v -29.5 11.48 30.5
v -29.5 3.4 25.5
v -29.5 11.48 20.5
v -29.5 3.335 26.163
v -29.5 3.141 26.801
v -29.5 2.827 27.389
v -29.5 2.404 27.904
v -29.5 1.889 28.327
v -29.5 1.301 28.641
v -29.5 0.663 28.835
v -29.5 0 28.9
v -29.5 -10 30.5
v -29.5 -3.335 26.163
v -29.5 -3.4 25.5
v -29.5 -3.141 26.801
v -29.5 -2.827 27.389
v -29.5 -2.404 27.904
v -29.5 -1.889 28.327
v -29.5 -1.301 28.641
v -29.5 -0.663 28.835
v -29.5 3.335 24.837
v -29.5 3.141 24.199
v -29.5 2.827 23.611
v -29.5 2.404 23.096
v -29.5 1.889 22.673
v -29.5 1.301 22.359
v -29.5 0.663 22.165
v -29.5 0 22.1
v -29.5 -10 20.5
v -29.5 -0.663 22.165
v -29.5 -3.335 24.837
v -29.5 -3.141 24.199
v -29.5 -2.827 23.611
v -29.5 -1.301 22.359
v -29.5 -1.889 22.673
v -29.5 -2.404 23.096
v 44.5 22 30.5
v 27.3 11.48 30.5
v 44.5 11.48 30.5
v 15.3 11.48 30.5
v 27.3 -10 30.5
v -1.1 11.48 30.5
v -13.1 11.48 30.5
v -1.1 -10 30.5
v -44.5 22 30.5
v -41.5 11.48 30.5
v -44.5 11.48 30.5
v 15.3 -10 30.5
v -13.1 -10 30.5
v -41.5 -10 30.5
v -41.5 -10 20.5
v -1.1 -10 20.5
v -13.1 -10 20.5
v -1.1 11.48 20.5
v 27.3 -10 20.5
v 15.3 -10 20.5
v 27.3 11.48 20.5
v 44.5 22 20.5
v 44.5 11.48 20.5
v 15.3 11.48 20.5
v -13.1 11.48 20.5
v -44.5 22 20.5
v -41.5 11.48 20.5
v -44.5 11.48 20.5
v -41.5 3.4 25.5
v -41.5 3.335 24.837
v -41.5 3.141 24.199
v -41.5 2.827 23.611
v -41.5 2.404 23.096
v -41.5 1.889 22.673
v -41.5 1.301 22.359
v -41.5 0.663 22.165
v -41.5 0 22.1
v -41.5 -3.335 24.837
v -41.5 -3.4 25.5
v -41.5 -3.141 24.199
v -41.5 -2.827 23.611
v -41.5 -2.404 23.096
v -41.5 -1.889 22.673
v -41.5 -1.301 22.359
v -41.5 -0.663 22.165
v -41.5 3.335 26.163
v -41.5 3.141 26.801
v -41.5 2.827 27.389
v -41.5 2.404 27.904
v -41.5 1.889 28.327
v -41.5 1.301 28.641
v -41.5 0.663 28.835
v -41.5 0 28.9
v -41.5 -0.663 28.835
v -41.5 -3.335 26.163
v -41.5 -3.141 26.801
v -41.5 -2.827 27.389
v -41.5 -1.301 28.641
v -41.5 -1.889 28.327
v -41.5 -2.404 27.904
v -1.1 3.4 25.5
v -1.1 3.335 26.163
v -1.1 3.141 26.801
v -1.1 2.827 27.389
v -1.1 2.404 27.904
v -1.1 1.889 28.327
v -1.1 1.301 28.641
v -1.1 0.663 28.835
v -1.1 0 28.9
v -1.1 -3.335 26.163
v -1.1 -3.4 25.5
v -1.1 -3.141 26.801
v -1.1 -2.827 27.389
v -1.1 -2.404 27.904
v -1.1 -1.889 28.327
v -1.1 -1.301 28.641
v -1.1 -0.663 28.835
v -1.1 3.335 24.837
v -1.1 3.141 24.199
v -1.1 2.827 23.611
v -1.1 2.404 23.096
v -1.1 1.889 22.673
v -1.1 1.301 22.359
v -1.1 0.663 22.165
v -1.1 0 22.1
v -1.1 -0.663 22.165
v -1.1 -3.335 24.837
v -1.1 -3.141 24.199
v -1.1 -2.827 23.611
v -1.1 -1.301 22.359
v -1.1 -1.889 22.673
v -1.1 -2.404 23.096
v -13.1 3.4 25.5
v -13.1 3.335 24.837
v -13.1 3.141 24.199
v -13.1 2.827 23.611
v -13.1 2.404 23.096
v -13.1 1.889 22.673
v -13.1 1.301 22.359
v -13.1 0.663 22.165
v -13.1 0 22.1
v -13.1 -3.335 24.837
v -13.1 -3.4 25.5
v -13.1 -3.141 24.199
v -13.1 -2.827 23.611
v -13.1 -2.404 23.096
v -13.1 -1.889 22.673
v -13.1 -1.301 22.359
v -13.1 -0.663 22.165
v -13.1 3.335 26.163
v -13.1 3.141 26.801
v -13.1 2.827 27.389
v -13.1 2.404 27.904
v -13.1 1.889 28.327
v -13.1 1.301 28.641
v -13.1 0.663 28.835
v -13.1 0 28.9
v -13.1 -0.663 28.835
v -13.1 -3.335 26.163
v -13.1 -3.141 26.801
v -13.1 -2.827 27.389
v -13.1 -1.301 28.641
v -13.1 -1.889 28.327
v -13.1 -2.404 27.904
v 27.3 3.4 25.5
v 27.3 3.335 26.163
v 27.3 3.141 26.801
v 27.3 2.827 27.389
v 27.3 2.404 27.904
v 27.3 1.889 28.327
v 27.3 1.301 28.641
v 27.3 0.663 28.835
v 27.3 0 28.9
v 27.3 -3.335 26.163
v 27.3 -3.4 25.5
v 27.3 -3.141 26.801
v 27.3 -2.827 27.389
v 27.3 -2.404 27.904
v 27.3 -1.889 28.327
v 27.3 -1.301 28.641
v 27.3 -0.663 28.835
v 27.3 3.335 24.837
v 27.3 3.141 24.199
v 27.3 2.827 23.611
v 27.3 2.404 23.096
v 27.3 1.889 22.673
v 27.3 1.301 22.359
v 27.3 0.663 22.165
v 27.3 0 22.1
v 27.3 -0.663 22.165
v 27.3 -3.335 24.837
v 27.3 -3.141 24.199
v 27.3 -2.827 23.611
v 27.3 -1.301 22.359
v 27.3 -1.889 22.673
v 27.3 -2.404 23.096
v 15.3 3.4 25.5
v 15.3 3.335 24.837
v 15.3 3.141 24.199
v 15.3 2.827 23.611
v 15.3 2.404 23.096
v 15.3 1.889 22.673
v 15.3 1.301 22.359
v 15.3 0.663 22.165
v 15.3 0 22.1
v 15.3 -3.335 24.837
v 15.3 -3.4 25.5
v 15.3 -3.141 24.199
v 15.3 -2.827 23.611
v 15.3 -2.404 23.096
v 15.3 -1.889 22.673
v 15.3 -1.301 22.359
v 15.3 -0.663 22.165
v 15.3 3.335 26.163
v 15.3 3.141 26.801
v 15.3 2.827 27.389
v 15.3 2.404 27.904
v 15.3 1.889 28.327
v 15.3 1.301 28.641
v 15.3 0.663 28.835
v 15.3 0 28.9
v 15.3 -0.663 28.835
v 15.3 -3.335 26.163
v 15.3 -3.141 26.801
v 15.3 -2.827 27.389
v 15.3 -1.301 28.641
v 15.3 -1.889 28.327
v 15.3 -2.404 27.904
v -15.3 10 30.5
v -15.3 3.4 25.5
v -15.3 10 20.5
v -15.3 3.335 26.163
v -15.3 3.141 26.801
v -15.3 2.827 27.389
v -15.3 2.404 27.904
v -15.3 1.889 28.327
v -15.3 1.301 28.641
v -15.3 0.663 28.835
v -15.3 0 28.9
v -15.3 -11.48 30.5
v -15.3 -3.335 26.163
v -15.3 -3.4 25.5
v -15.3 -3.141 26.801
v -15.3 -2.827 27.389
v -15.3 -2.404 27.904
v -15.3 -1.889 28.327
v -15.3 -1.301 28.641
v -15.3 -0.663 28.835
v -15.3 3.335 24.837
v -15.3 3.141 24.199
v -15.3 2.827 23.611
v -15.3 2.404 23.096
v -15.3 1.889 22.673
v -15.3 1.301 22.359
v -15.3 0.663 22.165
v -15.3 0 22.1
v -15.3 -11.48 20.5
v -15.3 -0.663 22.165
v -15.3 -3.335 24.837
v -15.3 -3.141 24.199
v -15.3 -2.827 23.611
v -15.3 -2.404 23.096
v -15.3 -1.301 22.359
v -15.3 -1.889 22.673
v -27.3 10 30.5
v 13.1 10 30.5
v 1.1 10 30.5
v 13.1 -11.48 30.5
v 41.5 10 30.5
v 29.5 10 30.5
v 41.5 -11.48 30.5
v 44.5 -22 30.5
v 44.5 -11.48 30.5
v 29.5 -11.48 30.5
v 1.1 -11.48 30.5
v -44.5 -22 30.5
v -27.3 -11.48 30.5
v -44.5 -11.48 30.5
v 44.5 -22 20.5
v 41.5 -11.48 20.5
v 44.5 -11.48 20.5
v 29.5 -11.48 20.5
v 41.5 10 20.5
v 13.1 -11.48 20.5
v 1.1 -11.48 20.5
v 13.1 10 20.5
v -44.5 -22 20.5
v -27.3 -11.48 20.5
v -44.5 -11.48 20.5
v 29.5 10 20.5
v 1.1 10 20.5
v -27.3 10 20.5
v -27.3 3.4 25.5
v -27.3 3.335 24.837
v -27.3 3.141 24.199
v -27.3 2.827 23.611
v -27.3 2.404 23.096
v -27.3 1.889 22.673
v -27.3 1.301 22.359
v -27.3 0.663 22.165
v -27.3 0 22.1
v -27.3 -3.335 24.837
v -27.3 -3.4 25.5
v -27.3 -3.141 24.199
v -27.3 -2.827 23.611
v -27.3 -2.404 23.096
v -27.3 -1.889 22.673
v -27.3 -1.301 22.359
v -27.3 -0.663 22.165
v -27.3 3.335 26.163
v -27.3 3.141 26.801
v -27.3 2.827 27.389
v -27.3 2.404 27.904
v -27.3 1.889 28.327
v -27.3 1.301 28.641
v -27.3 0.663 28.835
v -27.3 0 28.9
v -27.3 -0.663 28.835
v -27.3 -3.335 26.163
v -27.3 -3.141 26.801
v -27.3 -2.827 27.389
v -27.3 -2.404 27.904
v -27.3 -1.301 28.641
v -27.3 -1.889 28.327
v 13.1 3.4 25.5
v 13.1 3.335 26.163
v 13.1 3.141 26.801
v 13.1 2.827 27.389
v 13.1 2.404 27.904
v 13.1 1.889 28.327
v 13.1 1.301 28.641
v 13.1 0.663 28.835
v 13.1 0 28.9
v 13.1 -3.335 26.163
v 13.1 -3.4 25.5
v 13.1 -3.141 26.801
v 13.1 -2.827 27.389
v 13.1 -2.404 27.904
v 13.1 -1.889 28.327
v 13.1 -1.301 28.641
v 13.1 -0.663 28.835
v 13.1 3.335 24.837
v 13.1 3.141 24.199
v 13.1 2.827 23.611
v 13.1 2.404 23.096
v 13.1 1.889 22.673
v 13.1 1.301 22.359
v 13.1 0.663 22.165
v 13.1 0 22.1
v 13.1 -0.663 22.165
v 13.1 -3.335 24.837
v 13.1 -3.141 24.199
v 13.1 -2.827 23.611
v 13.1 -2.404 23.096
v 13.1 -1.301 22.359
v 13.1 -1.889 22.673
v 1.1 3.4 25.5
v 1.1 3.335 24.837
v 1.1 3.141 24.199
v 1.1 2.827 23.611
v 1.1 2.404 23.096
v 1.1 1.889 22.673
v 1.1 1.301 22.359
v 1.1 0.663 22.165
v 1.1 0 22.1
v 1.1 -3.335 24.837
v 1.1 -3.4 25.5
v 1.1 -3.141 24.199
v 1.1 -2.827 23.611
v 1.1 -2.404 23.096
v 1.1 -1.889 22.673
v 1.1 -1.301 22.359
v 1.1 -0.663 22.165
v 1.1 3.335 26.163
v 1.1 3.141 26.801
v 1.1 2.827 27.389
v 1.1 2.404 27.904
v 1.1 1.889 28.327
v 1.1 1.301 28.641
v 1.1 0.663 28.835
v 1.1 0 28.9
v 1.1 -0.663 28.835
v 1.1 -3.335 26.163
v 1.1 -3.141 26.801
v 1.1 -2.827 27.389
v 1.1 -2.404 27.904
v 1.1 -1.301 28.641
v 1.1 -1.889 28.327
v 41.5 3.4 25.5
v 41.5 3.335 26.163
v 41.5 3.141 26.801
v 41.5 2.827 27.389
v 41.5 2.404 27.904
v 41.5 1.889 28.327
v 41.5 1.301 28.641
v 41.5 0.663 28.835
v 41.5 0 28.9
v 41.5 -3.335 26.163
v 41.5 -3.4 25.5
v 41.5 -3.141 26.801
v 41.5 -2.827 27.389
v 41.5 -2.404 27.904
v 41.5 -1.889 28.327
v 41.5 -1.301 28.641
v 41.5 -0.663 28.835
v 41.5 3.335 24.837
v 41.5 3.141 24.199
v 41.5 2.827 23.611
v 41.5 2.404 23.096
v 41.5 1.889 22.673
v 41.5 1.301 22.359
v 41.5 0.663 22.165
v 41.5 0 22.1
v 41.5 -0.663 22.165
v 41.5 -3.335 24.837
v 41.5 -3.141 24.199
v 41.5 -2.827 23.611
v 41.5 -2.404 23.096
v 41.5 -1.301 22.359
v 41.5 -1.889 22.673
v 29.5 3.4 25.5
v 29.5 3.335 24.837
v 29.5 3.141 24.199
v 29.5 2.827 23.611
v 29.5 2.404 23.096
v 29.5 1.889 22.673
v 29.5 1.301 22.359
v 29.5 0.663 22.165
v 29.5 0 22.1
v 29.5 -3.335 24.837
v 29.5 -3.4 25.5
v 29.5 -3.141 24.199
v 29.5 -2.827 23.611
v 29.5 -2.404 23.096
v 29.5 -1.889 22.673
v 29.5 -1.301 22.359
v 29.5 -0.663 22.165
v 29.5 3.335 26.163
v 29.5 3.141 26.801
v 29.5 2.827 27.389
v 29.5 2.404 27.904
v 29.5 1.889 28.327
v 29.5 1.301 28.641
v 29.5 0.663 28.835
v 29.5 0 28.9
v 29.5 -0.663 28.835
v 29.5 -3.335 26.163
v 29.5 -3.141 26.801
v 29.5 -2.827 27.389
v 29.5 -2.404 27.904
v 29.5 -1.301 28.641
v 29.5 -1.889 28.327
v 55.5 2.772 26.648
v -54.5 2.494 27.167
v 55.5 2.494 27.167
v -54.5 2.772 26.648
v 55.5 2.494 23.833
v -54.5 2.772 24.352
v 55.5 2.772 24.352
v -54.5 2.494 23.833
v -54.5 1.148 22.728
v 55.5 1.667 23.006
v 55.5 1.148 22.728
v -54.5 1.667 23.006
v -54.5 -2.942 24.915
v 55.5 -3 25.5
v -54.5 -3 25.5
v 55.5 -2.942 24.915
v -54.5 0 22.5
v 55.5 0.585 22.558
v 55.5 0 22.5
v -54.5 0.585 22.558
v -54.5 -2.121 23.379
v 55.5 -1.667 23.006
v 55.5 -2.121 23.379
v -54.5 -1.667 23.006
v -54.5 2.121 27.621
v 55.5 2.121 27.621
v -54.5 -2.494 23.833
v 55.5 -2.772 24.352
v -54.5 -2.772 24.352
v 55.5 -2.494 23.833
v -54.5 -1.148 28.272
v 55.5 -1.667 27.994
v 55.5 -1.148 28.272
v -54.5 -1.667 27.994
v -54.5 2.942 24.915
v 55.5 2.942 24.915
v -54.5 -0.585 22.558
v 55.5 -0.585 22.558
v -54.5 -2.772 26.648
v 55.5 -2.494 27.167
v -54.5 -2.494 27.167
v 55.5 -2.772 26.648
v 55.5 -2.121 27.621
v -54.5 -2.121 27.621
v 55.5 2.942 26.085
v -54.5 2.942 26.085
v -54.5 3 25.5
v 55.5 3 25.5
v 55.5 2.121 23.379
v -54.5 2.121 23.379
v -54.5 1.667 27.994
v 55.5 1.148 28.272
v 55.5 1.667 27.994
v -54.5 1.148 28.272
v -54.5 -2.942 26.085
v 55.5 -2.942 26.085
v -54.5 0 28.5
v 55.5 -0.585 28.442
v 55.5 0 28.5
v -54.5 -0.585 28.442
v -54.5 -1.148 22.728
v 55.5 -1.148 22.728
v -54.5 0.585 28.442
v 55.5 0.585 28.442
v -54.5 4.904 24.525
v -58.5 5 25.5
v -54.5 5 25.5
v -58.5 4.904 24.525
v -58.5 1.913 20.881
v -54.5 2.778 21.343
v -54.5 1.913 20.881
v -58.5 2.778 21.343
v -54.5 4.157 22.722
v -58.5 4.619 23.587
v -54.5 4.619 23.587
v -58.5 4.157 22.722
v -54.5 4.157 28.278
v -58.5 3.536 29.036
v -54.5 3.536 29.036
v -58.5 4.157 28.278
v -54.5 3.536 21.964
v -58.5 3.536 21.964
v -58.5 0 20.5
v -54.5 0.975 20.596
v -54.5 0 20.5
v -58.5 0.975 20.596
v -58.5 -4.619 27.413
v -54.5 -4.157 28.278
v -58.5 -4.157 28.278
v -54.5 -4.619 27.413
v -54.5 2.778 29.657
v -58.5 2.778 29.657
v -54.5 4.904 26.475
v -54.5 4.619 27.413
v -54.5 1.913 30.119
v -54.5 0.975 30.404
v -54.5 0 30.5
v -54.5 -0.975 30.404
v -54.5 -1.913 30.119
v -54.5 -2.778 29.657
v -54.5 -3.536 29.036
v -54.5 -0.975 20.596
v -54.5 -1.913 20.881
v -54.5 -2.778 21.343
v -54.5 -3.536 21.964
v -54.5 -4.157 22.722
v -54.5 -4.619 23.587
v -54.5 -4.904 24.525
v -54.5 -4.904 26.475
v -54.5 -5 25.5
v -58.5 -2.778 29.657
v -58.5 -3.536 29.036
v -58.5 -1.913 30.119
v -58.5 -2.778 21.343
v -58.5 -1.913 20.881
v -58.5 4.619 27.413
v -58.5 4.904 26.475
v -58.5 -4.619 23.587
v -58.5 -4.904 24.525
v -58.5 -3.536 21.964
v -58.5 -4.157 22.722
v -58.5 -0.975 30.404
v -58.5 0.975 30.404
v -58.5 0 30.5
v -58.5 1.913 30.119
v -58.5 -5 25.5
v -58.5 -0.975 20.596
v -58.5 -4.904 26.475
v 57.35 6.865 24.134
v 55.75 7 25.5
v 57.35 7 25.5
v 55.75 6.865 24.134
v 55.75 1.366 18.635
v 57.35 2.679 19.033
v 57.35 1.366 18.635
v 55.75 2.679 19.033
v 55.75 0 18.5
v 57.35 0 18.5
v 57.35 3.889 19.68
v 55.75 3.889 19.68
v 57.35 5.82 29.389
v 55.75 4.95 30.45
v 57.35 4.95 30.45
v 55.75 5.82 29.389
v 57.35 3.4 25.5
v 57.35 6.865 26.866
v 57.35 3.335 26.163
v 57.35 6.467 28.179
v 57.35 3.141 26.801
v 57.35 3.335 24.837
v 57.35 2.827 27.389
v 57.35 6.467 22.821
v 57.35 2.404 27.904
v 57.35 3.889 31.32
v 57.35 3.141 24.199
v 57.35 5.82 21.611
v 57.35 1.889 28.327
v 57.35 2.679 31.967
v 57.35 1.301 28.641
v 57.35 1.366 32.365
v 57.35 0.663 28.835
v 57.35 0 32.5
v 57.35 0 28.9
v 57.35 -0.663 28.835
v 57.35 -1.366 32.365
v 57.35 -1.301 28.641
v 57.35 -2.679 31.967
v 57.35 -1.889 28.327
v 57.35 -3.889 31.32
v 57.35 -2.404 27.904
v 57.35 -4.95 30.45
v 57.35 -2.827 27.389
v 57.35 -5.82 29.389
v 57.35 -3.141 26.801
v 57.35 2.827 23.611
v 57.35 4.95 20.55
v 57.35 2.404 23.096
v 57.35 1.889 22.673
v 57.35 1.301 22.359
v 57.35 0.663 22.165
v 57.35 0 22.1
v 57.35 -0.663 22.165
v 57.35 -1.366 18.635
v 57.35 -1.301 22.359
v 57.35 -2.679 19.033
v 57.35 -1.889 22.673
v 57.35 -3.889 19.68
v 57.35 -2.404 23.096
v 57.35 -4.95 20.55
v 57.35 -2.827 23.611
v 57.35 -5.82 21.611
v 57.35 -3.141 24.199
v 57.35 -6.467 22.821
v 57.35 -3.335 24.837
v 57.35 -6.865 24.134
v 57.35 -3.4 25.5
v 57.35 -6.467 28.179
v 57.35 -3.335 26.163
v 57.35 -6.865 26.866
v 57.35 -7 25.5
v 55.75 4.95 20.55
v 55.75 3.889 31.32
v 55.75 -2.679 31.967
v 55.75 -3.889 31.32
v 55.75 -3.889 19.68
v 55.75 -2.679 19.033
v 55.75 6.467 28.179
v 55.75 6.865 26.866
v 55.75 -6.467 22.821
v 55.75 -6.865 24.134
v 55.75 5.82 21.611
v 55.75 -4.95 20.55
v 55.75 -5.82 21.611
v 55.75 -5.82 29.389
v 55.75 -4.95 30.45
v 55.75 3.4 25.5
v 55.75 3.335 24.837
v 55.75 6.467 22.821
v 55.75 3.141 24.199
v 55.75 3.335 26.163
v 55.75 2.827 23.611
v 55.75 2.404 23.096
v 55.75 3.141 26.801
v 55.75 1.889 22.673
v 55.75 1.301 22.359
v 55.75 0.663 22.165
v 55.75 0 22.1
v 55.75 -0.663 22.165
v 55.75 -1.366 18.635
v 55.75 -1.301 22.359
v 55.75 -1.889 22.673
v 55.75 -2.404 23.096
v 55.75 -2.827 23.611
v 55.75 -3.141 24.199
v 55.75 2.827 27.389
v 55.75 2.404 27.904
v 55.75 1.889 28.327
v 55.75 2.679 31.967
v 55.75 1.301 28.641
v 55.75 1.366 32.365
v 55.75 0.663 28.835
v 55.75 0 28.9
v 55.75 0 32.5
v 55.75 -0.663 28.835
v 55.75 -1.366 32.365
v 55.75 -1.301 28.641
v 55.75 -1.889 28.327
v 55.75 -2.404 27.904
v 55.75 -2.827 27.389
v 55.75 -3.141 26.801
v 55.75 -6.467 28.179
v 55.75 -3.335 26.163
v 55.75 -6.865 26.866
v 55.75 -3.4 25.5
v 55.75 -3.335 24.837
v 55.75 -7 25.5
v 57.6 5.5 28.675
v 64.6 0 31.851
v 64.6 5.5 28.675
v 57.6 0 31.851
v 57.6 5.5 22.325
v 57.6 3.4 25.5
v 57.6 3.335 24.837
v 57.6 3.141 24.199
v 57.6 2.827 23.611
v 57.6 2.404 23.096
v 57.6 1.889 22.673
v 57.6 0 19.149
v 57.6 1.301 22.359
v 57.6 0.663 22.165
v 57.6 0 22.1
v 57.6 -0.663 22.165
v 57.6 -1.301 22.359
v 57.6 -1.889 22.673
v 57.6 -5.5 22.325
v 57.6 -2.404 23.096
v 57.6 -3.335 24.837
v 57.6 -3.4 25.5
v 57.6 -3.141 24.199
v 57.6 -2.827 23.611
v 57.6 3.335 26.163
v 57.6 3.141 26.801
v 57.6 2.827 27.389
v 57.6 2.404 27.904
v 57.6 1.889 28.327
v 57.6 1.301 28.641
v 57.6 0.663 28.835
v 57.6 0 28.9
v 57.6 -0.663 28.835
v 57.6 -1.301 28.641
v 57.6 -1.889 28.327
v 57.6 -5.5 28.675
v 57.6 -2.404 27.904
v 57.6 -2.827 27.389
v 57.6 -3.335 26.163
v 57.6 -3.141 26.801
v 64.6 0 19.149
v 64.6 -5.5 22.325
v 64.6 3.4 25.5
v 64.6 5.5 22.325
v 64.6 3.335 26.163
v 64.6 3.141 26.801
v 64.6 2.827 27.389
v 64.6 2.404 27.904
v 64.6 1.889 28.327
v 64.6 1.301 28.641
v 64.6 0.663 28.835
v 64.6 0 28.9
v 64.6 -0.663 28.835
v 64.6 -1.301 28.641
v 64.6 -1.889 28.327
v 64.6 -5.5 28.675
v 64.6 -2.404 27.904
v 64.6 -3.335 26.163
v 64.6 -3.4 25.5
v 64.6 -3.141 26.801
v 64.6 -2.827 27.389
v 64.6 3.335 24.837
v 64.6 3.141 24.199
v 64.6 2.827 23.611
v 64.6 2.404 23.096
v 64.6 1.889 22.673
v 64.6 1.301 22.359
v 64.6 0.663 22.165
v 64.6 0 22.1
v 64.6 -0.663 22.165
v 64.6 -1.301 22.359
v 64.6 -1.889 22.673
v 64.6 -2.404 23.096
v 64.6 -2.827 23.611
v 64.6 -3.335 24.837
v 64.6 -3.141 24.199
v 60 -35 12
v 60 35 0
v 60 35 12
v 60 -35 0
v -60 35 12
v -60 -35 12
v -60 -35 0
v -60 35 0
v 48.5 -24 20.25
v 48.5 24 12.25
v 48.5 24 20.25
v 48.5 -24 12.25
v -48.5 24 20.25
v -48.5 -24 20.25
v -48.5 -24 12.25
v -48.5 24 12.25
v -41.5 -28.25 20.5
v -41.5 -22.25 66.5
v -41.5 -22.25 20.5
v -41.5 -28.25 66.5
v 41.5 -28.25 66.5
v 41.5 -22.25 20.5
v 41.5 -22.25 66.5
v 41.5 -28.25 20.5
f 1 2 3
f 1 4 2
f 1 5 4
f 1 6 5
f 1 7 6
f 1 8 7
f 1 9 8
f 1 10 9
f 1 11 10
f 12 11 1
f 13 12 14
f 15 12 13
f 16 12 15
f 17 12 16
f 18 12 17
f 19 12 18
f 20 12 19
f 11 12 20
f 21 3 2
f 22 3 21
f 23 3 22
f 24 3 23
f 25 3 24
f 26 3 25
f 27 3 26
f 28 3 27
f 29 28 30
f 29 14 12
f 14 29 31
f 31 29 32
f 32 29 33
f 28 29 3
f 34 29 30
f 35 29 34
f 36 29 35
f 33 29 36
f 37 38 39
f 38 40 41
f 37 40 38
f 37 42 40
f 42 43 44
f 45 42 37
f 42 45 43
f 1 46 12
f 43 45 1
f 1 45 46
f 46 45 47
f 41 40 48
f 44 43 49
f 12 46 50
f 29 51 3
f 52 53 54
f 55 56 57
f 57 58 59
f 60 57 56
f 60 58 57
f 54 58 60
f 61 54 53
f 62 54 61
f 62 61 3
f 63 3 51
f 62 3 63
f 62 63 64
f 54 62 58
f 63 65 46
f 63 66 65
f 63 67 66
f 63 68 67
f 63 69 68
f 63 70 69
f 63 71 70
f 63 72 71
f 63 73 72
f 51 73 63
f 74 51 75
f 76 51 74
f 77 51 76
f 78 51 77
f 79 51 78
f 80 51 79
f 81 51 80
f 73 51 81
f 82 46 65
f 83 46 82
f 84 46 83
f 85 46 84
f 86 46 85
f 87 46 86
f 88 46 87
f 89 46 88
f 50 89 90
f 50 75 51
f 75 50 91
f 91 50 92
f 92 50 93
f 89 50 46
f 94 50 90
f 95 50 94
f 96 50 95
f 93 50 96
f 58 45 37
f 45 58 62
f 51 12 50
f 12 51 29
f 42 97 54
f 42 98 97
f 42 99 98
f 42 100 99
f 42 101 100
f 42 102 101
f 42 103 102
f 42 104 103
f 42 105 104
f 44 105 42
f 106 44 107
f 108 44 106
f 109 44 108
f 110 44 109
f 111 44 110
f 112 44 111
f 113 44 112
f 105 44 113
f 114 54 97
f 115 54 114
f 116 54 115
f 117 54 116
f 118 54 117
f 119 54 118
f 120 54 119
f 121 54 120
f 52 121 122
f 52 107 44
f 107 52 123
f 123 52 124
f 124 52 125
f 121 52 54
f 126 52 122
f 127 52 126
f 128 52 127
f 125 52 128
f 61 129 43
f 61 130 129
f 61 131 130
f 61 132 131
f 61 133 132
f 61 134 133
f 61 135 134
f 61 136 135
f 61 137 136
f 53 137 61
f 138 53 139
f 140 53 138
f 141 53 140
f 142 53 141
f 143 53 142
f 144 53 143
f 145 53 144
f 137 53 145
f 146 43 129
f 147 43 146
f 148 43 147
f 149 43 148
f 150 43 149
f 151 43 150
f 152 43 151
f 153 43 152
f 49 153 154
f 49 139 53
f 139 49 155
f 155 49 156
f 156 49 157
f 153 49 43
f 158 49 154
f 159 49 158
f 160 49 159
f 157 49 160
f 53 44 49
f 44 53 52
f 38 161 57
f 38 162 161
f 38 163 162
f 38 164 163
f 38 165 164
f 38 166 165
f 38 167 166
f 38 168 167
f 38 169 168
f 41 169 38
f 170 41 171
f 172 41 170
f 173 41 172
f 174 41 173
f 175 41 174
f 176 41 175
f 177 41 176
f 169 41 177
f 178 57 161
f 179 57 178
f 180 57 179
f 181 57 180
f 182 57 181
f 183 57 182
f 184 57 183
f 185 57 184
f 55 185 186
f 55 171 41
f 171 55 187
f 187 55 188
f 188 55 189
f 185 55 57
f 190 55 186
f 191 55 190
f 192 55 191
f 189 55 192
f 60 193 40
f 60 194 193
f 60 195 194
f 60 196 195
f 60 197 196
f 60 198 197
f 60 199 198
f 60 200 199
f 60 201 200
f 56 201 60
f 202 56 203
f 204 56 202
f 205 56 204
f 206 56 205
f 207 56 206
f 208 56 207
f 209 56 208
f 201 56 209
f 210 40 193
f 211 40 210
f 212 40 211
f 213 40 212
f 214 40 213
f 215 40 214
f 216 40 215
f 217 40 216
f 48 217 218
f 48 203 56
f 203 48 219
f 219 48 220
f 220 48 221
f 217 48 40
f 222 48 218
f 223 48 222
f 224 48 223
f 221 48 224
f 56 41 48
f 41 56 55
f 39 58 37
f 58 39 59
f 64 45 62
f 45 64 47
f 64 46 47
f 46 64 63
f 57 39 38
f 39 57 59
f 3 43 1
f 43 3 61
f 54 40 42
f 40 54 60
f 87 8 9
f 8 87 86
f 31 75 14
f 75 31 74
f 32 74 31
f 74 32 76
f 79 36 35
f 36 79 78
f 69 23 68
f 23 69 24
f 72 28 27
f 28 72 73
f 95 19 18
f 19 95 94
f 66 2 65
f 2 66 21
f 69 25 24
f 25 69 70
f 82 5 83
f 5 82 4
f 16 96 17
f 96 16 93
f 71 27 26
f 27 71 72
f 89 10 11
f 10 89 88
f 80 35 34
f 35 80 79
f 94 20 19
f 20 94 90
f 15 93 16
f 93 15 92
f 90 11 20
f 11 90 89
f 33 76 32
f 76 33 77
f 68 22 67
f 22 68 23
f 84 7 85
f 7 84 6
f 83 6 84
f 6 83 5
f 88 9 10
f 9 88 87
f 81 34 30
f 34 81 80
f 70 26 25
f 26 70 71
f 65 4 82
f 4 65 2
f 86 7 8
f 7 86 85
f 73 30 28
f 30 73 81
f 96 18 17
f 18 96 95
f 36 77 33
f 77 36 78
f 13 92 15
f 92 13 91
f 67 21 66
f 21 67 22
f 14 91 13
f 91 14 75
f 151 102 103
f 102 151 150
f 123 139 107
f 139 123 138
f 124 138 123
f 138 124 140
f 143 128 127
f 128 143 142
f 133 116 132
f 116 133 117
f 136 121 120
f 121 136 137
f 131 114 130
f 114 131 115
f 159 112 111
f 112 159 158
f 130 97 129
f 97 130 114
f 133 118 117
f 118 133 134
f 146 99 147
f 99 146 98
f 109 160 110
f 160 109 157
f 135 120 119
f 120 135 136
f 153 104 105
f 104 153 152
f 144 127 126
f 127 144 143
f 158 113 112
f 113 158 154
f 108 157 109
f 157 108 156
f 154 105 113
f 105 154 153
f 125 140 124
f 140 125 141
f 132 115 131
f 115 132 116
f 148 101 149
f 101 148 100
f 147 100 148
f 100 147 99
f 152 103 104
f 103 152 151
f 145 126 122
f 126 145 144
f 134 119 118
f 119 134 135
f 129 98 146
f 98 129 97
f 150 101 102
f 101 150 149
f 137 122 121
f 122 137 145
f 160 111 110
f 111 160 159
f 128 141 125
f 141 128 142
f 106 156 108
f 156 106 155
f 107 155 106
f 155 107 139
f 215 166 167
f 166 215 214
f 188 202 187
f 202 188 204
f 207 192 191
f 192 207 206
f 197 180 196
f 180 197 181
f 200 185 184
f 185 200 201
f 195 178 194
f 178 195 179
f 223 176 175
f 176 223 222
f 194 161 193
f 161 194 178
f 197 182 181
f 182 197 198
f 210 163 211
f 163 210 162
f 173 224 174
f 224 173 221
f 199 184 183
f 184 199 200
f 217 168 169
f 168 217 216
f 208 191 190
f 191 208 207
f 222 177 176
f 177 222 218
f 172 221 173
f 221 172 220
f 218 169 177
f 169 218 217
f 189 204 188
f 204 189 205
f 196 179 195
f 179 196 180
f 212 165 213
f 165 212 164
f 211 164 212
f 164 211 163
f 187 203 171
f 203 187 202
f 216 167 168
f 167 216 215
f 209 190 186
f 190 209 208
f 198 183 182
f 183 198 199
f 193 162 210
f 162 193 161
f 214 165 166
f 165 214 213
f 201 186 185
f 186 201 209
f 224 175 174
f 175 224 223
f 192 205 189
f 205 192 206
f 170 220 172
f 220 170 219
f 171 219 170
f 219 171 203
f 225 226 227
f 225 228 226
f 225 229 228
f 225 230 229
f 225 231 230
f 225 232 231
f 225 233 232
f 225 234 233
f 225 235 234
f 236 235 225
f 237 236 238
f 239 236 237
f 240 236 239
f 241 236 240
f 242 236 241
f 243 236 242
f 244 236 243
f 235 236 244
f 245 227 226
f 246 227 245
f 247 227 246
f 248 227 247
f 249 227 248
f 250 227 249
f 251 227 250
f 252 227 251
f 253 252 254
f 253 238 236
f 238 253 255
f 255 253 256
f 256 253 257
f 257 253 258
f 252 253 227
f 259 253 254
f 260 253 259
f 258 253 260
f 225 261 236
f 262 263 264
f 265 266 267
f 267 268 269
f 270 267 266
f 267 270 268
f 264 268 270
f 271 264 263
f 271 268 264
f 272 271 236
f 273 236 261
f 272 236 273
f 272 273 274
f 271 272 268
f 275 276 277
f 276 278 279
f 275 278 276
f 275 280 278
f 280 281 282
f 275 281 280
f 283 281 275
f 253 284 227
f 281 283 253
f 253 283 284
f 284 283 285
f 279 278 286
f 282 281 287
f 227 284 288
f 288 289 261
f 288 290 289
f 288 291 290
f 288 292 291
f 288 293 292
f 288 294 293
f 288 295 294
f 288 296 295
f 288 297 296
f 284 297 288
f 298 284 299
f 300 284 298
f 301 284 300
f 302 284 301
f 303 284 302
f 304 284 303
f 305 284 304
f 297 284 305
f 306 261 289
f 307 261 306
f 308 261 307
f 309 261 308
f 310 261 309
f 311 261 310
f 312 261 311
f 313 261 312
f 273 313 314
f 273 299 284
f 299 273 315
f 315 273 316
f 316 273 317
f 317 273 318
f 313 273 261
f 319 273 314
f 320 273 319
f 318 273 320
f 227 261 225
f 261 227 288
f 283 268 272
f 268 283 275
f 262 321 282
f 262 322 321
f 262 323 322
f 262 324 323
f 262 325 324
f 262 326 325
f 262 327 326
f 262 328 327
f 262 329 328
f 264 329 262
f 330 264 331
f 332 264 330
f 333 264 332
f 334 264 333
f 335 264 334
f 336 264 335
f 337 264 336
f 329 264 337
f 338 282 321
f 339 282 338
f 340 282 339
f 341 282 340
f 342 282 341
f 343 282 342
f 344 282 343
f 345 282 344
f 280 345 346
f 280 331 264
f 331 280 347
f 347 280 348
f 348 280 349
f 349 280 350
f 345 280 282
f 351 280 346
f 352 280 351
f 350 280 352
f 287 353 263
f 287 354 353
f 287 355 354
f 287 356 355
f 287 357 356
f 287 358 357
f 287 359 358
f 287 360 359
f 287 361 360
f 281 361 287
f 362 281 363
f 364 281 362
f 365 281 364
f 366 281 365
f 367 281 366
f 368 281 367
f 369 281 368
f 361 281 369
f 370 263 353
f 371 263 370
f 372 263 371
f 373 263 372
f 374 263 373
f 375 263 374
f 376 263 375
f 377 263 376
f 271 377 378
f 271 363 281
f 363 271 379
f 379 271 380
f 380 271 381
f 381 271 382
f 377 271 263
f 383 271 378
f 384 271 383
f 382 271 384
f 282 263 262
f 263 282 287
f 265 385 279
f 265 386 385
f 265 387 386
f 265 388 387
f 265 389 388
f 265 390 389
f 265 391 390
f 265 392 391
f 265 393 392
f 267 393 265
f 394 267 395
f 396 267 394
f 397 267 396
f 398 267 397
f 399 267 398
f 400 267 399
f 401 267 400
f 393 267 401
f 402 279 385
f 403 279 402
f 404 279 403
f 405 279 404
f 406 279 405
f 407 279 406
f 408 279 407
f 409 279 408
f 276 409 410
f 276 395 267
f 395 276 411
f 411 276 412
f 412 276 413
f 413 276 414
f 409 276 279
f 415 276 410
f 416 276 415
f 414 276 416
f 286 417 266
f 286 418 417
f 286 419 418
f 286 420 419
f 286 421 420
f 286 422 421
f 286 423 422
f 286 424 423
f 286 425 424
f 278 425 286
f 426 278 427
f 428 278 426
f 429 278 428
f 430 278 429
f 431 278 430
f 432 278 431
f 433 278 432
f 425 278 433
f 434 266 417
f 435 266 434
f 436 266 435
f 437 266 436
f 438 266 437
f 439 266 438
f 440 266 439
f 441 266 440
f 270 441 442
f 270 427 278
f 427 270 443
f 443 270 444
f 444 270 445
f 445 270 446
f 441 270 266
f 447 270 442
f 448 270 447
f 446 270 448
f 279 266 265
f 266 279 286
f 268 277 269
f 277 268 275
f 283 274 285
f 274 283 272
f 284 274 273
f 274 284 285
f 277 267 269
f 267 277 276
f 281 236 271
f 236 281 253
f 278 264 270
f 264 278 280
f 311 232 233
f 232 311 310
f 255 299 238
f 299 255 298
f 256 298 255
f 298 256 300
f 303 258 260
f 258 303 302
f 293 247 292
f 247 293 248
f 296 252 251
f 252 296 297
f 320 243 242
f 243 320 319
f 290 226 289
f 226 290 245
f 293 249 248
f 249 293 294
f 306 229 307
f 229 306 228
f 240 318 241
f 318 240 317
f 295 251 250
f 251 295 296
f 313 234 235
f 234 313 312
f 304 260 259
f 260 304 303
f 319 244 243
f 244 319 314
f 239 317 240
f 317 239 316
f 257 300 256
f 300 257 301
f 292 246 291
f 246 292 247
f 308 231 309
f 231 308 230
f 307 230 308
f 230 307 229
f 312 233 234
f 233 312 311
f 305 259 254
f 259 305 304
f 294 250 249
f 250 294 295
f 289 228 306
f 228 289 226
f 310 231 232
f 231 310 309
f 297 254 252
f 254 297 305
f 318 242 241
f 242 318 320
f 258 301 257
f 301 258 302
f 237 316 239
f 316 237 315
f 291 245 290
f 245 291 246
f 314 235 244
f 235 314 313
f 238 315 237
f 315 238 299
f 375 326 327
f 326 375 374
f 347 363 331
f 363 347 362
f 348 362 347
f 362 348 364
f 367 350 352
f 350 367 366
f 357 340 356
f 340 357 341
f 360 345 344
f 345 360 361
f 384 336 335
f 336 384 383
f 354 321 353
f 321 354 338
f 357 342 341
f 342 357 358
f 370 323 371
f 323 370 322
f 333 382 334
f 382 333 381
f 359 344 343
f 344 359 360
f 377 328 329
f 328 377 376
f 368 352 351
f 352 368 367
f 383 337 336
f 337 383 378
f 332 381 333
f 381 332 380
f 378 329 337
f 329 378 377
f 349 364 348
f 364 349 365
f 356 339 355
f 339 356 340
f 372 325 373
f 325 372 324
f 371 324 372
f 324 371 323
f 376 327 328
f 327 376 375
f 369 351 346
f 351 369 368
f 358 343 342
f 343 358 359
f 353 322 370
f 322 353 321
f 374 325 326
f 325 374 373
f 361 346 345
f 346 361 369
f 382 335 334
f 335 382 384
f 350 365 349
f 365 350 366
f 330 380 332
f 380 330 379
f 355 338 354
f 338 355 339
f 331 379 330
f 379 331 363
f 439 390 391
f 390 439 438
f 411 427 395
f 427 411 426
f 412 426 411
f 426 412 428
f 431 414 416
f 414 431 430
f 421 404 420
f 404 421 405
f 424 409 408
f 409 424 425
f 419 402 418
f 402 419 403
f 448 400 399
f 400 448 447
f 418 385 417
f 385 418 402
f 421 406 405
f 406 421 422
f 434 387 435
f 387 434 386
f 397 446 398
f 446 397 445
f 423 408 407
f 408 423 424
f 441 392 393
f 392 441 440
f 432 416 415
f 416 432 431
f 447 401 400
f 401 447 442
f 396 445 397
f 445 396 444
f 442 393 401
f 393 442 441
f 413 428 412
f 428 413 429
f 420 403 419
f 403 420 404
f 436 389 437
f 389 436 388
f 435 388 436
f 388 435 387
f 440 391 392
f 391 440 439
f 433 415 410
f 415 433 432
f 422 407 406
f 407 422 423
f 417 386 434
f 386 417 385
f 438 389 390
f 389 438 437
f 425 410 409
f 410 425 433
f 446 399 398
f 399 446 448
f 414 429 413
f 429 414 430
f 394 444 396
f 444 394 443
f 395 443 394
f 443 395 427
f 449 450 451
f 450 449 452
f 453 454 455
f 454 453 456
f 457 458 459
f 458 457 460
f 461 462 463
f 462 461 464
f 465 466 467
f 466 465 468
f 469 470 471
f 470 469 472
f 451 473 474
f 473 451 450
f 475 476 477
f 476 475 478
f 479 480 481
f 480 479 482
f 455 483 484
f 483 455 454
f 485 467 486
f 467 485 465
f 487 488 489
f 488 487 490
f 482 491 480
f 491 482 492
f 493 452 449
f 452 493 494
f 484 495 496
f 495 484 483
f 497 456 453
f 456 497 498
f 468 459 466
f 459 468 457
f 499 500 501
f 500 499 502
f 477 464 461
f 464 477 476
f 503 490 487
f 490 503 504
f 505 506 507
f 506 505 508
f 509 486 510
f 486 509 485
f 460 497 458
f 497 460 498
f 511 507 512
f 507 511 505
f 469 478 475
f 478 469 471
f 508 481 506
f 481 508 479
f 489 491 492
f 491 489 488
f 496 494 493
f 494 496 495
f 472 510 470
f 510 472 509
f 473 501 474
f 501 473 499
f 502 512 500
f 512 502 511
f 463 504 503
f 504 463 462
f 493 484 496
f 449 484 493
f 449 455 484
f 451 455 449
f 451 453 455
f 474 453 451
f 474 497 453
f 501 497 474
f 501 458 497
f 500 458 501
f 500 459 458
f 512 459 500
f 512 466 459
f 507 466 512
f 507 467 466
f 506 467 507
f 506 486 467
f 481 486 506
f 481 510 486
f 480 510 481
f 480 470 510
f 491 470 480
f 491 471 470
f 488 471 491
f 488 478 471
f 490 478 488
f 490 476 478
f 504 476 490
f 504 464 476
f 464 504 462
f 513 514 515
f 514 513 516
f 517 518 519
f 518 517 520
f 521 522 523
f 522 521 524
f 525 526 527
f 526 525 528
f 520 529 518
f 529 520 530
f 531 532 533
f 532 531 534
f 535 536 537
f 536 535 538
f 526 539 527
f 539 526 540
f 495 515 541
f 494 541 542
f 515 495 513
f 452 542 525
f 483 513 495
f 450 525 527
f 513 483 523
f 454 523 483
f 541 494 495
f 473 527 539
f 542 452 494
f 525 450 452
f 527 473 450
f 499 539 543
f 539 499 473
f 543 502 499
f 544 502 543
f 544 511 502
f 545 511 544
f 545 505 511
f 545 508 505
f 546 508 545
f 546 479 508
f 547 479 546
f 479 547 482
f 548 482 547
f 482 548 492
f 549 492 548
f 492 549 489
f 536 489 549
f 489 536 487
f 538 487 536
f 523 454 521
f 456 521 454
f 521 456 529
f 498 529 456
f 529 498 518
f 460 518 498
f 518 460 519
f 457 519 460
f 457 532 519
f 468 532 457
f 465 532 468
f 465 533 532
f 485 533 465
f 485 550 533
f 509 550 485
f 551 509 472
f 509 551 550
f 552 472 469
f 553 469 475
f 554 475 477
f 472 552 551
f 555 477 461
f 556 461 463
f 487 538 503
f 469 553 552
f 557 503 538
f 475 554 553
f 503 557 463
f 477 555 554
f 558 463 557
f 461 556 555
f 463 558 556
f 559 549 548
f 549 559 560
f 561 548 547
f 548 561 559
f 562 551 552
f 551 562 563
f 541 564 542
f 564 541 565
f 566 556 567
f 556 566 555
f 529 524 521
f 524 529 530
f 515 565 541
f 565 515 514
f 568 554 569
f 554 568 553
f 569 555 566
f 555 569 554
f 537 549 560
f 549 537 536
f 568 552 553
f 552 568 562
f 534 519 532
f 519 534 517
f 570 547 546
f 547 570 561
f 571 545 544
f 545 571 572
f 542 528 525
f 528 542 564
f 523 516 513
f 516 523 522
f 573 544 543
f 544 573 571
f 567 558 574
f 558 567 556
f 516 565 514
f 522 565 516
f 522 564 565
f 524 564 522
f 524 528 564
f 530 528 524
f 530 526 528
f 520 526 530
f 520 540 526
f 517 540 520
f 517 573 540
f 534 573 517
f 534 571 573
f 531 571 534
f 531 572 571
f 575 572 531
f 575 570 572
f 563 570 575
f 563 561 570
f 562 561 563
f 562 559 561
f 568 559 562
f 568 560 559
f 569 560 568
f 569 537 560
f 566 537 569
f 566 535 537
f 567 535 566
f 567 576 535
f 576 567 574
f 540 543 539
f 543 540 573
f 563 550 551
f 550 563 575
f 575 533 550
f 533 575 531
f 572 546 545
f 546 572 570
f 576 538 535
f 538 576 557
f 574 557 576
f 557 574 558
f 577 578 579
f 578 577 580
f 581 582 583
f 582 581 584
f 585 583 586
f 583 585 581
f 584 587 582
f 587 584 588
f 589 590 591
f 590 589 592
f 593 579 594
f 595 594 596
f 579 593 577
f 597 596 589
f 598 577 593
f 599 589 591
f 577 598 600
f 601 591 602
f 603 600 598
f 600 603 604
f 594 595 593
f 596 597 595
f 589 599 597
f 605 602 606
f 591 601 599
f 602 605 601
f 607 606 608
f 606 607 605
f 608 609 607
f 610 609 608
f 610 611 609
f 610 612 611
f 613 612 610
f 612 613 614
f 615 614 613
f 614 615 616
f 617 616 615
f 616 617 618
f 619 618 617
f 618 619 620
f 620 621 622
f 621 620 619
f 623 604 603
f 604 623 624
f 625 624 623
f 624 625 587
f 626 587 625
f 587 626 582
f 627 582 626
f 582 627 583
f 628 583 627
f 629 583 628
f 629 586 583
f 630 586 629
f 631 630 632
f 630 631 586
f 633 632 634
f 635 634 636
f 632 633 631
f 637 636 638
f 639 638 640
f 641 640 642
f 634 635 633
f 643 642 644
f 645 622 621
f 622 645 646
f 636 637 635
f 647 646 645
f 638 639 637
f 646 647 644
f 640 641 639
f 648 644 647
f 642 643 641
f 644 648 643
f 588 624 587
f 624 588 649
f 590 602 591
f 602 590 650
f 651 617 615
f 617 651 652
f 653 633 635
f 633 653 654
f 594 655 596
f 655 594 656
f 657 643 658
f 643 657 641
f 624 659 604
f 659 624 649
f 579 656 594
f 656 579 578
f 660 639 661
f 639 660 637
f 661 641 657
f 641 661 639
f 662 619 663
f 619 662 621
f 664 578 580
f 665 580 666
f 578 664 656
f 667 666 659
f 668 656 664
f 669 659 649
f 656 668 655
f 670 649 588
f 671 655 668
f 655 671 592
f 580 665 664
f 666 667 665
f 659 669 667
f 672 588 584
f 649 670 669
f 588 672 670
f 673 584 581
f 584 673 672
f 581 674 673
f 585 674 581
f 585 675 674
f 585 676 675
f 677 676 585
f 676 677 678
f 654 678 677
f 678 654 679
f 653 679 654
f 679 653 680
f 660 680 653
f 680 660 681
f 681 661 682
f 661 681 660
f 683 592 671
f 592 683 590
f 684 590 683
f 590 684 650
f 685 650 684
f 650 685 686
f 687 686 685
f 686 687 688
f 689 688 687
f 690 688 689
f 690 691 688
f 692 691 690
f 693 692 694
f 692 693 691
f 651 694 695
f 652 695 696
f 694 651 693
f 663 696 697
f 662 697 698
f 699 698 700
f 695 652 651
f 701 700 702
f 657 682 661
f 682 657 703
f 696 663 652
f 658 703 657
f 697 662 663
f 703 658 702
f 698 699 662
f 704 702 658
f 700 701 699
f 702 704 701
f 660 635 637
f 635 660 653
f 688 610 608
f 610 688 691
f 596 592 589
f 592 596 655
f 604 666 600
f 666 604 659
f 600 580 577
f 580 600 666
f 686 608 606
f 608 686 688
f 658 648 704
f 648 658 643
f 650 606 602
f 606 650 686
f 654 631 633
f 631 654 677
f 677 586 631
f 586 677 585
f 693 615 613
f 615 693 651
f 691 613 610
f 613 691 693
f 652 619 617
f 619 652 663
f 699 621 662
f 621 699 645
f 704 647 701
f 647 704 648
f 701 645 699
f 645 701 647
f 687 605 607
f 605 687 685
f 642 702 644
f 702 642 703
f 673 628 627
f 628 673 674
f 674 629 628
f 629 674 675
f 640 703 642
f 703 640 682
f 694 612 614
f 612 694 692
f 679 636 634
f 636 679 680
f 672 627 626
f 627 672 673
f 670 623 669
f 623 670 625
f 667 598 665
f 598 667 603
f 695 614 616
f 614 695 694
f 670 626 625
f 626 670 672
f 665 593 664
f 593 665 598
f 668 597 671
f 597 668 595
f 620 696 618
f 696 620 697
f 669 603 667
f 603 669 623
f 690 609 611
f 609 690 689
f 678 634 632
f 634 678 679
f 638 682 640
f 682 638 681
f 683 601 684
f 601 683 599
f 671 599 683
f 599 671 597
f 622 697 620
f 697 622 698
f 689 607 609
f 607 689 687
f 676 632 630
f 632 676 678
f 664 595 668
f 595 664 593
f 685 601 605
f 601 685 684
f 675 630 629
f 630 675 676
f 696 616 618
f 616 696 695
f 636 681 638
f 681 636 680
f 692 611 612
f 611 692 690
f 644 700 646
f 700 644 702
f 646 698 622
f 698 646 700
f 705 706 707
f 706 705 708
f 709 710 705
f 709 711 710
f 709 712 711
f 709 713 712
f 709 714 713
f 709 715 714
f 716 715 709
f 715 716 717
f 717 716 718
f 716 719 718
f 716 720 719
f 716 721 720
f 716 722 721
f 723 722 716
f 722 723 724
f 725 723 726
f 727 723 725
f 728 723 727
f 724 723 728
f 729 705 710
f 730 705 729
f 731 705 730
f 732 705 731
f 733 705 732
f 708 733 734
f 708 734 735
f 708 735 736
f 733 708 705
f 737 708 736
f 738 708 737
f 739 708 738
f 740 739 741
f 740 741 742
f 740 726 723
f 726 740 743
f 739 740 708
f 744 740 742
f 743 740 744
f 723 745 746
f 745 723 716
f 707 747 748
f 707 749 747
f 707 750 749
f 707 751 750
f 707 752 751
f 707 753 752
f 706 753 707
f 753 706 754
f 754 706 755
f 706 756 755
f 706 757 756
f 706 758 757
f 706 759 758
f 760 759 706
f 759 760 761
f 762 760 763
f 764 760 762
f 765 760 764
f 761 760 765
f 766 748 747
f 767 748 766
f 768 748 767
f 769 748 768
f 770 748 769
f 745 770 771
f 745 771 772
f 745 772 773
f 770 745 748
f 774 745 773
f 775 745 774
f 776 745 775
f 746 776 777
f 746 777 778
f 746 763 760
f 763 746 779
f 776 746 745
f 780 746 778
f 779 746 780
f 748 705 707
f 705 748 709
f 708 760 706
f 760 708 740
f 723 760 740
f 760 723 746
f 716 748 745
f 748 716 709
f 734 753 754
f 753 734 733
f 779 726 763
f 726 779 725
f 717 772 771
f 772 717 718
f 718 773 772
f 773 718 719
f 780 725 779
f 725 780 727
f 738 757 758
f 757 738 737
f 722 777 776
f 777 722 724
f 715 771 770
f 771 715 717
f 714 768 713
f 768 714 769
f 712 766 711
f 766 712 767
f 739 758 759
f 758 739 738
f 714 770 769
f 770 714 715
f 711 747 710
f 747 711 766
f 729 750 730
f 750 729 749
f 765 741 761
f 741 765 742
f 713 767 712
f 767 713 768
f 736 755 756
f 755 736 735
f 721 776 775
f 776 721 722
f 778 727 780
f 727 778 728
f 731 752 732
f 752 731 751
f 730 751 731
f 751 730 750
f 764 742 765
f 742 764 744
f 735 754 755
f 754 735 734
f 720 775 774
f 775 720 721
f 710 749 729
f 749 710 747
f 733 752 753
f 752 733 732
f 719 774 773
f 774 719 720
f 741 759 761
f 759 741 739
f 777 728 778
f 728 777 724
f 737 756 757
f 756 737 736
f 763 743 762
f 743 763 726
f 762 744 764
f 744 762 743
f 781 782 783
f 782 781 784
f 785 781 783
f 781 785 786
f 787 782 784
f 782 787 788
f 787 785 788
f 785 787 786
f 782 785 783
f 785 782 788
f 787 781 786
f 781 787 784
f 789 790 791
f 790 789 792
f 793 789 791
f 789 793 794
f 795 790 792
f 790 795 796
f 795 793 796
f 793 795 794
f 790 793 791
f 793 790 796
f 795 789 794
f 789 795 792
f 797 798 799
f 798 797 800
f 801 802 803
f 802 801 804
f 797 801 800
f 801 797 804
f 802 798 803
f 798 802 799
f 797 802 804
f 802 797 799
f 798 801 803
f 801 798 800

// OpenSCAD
$fn = 32;

// ------------------------------------------------------------------------
// Comb hinge with flap: leaf 89 x 22 mm, pin d6, flap 46 mm
// Every part is its own module, assembly() places every instance.
// ------------------------------------------------------------------------

// --- part 1 ---
module hinge_bed() {
  difference() {
    translate([-60, -35, 0]) cube([120, 70, 12]);
  }
}

// --- part 2 ---
module hinge_riser() {
  difference() {
    translate([-48.5, -24, 0]) cube([97, 48, 8]);
  }
}

// --- part 3 ---
module hinge_leaf_a() {
  difference() {
    union() {
      translate([-41.5, -10, -5]) cube([12, 32, 10]);
      translate([-13.1, -10, -5]) cube([12, 32, 10]);
      translate([15.3, -10, -5]) cube([12, 32, 10]);
      translate([-44.5, 11.48, -5]) cube([89, 10.52, 10]);
    }
    translate([-35.5, 0, 0]) rotate([0, 90, 0]) cylinder(h = 14, d = 6.8, center = true);
    translate([-7.1, 0, 0]) rotate([0, 90, 0]) cylinder(h = 14, d = 6.8, center = true);
    translate([21.3, 0, 0]) rotate([0, 90, 0]) cylinder(h = 14, d = 6.8, center = true);
  }
}

// --- part 4 ---
module hinge_leaf_b() {
  difference() {
    union() {
      translate([-27.3, -22, -5]) cube([12, 32, 10]);
      translate([1.1, -22, -5]) cube([12, 32, 10]);
      translate([29.5, -22, -5]) cube([12, 32, 10]);
      translate([-44.5, -22, -5]) cube([89, 10.52, 10]);
    }
    translate([-21.3, 0, 0]) rotate([0, 90, 0]) cylinder(h = 14, d = 6.8, center = true);
    translate([7.1, 0, 0]) rotate([0, 90, 0]) cylinder(h = 14, d = 6.8, center = true);
    translate([35.5, 0, 0]) rotate([0, 90, 0]) cylinder(h = 14, d = 6.8, center = true);
  }
}

// --- part 5 ---
module hinge_flap() {
  difference() {
    translate([-41.5, -23, 0]) cube([83, 46, 6]);
  }
}

// --- part 6 ---
module hinge_pin() {
  rotate([0, 90, 0]) cylinder(h = 111, d = 6, center = true);
  translate([-58.5, 0, 0]) rotate([0, 90, 0]) cylinder(h = 4, d = 10);
}

// --- part 7 ---
module pin_washer() {
  difference() {
      translate([0, 0, 0]) cylinder(h = 1.6, d = 14);
      translate([0, 0, -1]) cylinder(h = 3.6, d = 6.8);
    }
}

// --- part 8 ---
module pin_nut() {
  difference() {
    linear_extrude(height = 7) polygon(points = [[6.351, 0], [3.175, 5.5], [-3.175, 5.5], [-6.351, 0], [-3.175, -5.5], [3.175, -5.5]]);
    translate([0, 0, -1]) cylinder(h = 9, d = 6.8);
  }
}

// --- assembly ---
module assembly() {
  color([0.80, 0.24, 0.20]) translate([0, 0, 0]) rotate([0, 0, 0]) hinge_bed();
  color([0.20, 0.45, 0.75]) translate([0, 0, 12.25]) rotate([0, 0, 0]) hinge_riser();
  color([0.25, 0.62, 0.32]) translate([0, 0, 25.5]) rotate([0, 0, 0]) hinge_leaf_a();
  color([0.92, 0.70, 0.18]) translate([0, 0, 25.5]) rotate([0, 0, 0]) hinge_leaf_b();
  color([0.58, 0.35, 0.70]) translate([0, -22.25, 43.5]) rotate([90, 0, 0]) hinge_flap();
  color([0.16, 0.66, 0.66]) translate([0, 0, 25.5]) rotate([0, 0, 0]) hinge_pin();
  color([0.85, 0.48, 0.18]) translate([55.75, 0, 25.5]) rotate([0, 90, 0]) pin_washer();
  color([0.55, 0.60, 0.65]) translate([57.6, 0, 25.5]) rotate([0, 90, 0]) pin_nut();
}

assembly();
